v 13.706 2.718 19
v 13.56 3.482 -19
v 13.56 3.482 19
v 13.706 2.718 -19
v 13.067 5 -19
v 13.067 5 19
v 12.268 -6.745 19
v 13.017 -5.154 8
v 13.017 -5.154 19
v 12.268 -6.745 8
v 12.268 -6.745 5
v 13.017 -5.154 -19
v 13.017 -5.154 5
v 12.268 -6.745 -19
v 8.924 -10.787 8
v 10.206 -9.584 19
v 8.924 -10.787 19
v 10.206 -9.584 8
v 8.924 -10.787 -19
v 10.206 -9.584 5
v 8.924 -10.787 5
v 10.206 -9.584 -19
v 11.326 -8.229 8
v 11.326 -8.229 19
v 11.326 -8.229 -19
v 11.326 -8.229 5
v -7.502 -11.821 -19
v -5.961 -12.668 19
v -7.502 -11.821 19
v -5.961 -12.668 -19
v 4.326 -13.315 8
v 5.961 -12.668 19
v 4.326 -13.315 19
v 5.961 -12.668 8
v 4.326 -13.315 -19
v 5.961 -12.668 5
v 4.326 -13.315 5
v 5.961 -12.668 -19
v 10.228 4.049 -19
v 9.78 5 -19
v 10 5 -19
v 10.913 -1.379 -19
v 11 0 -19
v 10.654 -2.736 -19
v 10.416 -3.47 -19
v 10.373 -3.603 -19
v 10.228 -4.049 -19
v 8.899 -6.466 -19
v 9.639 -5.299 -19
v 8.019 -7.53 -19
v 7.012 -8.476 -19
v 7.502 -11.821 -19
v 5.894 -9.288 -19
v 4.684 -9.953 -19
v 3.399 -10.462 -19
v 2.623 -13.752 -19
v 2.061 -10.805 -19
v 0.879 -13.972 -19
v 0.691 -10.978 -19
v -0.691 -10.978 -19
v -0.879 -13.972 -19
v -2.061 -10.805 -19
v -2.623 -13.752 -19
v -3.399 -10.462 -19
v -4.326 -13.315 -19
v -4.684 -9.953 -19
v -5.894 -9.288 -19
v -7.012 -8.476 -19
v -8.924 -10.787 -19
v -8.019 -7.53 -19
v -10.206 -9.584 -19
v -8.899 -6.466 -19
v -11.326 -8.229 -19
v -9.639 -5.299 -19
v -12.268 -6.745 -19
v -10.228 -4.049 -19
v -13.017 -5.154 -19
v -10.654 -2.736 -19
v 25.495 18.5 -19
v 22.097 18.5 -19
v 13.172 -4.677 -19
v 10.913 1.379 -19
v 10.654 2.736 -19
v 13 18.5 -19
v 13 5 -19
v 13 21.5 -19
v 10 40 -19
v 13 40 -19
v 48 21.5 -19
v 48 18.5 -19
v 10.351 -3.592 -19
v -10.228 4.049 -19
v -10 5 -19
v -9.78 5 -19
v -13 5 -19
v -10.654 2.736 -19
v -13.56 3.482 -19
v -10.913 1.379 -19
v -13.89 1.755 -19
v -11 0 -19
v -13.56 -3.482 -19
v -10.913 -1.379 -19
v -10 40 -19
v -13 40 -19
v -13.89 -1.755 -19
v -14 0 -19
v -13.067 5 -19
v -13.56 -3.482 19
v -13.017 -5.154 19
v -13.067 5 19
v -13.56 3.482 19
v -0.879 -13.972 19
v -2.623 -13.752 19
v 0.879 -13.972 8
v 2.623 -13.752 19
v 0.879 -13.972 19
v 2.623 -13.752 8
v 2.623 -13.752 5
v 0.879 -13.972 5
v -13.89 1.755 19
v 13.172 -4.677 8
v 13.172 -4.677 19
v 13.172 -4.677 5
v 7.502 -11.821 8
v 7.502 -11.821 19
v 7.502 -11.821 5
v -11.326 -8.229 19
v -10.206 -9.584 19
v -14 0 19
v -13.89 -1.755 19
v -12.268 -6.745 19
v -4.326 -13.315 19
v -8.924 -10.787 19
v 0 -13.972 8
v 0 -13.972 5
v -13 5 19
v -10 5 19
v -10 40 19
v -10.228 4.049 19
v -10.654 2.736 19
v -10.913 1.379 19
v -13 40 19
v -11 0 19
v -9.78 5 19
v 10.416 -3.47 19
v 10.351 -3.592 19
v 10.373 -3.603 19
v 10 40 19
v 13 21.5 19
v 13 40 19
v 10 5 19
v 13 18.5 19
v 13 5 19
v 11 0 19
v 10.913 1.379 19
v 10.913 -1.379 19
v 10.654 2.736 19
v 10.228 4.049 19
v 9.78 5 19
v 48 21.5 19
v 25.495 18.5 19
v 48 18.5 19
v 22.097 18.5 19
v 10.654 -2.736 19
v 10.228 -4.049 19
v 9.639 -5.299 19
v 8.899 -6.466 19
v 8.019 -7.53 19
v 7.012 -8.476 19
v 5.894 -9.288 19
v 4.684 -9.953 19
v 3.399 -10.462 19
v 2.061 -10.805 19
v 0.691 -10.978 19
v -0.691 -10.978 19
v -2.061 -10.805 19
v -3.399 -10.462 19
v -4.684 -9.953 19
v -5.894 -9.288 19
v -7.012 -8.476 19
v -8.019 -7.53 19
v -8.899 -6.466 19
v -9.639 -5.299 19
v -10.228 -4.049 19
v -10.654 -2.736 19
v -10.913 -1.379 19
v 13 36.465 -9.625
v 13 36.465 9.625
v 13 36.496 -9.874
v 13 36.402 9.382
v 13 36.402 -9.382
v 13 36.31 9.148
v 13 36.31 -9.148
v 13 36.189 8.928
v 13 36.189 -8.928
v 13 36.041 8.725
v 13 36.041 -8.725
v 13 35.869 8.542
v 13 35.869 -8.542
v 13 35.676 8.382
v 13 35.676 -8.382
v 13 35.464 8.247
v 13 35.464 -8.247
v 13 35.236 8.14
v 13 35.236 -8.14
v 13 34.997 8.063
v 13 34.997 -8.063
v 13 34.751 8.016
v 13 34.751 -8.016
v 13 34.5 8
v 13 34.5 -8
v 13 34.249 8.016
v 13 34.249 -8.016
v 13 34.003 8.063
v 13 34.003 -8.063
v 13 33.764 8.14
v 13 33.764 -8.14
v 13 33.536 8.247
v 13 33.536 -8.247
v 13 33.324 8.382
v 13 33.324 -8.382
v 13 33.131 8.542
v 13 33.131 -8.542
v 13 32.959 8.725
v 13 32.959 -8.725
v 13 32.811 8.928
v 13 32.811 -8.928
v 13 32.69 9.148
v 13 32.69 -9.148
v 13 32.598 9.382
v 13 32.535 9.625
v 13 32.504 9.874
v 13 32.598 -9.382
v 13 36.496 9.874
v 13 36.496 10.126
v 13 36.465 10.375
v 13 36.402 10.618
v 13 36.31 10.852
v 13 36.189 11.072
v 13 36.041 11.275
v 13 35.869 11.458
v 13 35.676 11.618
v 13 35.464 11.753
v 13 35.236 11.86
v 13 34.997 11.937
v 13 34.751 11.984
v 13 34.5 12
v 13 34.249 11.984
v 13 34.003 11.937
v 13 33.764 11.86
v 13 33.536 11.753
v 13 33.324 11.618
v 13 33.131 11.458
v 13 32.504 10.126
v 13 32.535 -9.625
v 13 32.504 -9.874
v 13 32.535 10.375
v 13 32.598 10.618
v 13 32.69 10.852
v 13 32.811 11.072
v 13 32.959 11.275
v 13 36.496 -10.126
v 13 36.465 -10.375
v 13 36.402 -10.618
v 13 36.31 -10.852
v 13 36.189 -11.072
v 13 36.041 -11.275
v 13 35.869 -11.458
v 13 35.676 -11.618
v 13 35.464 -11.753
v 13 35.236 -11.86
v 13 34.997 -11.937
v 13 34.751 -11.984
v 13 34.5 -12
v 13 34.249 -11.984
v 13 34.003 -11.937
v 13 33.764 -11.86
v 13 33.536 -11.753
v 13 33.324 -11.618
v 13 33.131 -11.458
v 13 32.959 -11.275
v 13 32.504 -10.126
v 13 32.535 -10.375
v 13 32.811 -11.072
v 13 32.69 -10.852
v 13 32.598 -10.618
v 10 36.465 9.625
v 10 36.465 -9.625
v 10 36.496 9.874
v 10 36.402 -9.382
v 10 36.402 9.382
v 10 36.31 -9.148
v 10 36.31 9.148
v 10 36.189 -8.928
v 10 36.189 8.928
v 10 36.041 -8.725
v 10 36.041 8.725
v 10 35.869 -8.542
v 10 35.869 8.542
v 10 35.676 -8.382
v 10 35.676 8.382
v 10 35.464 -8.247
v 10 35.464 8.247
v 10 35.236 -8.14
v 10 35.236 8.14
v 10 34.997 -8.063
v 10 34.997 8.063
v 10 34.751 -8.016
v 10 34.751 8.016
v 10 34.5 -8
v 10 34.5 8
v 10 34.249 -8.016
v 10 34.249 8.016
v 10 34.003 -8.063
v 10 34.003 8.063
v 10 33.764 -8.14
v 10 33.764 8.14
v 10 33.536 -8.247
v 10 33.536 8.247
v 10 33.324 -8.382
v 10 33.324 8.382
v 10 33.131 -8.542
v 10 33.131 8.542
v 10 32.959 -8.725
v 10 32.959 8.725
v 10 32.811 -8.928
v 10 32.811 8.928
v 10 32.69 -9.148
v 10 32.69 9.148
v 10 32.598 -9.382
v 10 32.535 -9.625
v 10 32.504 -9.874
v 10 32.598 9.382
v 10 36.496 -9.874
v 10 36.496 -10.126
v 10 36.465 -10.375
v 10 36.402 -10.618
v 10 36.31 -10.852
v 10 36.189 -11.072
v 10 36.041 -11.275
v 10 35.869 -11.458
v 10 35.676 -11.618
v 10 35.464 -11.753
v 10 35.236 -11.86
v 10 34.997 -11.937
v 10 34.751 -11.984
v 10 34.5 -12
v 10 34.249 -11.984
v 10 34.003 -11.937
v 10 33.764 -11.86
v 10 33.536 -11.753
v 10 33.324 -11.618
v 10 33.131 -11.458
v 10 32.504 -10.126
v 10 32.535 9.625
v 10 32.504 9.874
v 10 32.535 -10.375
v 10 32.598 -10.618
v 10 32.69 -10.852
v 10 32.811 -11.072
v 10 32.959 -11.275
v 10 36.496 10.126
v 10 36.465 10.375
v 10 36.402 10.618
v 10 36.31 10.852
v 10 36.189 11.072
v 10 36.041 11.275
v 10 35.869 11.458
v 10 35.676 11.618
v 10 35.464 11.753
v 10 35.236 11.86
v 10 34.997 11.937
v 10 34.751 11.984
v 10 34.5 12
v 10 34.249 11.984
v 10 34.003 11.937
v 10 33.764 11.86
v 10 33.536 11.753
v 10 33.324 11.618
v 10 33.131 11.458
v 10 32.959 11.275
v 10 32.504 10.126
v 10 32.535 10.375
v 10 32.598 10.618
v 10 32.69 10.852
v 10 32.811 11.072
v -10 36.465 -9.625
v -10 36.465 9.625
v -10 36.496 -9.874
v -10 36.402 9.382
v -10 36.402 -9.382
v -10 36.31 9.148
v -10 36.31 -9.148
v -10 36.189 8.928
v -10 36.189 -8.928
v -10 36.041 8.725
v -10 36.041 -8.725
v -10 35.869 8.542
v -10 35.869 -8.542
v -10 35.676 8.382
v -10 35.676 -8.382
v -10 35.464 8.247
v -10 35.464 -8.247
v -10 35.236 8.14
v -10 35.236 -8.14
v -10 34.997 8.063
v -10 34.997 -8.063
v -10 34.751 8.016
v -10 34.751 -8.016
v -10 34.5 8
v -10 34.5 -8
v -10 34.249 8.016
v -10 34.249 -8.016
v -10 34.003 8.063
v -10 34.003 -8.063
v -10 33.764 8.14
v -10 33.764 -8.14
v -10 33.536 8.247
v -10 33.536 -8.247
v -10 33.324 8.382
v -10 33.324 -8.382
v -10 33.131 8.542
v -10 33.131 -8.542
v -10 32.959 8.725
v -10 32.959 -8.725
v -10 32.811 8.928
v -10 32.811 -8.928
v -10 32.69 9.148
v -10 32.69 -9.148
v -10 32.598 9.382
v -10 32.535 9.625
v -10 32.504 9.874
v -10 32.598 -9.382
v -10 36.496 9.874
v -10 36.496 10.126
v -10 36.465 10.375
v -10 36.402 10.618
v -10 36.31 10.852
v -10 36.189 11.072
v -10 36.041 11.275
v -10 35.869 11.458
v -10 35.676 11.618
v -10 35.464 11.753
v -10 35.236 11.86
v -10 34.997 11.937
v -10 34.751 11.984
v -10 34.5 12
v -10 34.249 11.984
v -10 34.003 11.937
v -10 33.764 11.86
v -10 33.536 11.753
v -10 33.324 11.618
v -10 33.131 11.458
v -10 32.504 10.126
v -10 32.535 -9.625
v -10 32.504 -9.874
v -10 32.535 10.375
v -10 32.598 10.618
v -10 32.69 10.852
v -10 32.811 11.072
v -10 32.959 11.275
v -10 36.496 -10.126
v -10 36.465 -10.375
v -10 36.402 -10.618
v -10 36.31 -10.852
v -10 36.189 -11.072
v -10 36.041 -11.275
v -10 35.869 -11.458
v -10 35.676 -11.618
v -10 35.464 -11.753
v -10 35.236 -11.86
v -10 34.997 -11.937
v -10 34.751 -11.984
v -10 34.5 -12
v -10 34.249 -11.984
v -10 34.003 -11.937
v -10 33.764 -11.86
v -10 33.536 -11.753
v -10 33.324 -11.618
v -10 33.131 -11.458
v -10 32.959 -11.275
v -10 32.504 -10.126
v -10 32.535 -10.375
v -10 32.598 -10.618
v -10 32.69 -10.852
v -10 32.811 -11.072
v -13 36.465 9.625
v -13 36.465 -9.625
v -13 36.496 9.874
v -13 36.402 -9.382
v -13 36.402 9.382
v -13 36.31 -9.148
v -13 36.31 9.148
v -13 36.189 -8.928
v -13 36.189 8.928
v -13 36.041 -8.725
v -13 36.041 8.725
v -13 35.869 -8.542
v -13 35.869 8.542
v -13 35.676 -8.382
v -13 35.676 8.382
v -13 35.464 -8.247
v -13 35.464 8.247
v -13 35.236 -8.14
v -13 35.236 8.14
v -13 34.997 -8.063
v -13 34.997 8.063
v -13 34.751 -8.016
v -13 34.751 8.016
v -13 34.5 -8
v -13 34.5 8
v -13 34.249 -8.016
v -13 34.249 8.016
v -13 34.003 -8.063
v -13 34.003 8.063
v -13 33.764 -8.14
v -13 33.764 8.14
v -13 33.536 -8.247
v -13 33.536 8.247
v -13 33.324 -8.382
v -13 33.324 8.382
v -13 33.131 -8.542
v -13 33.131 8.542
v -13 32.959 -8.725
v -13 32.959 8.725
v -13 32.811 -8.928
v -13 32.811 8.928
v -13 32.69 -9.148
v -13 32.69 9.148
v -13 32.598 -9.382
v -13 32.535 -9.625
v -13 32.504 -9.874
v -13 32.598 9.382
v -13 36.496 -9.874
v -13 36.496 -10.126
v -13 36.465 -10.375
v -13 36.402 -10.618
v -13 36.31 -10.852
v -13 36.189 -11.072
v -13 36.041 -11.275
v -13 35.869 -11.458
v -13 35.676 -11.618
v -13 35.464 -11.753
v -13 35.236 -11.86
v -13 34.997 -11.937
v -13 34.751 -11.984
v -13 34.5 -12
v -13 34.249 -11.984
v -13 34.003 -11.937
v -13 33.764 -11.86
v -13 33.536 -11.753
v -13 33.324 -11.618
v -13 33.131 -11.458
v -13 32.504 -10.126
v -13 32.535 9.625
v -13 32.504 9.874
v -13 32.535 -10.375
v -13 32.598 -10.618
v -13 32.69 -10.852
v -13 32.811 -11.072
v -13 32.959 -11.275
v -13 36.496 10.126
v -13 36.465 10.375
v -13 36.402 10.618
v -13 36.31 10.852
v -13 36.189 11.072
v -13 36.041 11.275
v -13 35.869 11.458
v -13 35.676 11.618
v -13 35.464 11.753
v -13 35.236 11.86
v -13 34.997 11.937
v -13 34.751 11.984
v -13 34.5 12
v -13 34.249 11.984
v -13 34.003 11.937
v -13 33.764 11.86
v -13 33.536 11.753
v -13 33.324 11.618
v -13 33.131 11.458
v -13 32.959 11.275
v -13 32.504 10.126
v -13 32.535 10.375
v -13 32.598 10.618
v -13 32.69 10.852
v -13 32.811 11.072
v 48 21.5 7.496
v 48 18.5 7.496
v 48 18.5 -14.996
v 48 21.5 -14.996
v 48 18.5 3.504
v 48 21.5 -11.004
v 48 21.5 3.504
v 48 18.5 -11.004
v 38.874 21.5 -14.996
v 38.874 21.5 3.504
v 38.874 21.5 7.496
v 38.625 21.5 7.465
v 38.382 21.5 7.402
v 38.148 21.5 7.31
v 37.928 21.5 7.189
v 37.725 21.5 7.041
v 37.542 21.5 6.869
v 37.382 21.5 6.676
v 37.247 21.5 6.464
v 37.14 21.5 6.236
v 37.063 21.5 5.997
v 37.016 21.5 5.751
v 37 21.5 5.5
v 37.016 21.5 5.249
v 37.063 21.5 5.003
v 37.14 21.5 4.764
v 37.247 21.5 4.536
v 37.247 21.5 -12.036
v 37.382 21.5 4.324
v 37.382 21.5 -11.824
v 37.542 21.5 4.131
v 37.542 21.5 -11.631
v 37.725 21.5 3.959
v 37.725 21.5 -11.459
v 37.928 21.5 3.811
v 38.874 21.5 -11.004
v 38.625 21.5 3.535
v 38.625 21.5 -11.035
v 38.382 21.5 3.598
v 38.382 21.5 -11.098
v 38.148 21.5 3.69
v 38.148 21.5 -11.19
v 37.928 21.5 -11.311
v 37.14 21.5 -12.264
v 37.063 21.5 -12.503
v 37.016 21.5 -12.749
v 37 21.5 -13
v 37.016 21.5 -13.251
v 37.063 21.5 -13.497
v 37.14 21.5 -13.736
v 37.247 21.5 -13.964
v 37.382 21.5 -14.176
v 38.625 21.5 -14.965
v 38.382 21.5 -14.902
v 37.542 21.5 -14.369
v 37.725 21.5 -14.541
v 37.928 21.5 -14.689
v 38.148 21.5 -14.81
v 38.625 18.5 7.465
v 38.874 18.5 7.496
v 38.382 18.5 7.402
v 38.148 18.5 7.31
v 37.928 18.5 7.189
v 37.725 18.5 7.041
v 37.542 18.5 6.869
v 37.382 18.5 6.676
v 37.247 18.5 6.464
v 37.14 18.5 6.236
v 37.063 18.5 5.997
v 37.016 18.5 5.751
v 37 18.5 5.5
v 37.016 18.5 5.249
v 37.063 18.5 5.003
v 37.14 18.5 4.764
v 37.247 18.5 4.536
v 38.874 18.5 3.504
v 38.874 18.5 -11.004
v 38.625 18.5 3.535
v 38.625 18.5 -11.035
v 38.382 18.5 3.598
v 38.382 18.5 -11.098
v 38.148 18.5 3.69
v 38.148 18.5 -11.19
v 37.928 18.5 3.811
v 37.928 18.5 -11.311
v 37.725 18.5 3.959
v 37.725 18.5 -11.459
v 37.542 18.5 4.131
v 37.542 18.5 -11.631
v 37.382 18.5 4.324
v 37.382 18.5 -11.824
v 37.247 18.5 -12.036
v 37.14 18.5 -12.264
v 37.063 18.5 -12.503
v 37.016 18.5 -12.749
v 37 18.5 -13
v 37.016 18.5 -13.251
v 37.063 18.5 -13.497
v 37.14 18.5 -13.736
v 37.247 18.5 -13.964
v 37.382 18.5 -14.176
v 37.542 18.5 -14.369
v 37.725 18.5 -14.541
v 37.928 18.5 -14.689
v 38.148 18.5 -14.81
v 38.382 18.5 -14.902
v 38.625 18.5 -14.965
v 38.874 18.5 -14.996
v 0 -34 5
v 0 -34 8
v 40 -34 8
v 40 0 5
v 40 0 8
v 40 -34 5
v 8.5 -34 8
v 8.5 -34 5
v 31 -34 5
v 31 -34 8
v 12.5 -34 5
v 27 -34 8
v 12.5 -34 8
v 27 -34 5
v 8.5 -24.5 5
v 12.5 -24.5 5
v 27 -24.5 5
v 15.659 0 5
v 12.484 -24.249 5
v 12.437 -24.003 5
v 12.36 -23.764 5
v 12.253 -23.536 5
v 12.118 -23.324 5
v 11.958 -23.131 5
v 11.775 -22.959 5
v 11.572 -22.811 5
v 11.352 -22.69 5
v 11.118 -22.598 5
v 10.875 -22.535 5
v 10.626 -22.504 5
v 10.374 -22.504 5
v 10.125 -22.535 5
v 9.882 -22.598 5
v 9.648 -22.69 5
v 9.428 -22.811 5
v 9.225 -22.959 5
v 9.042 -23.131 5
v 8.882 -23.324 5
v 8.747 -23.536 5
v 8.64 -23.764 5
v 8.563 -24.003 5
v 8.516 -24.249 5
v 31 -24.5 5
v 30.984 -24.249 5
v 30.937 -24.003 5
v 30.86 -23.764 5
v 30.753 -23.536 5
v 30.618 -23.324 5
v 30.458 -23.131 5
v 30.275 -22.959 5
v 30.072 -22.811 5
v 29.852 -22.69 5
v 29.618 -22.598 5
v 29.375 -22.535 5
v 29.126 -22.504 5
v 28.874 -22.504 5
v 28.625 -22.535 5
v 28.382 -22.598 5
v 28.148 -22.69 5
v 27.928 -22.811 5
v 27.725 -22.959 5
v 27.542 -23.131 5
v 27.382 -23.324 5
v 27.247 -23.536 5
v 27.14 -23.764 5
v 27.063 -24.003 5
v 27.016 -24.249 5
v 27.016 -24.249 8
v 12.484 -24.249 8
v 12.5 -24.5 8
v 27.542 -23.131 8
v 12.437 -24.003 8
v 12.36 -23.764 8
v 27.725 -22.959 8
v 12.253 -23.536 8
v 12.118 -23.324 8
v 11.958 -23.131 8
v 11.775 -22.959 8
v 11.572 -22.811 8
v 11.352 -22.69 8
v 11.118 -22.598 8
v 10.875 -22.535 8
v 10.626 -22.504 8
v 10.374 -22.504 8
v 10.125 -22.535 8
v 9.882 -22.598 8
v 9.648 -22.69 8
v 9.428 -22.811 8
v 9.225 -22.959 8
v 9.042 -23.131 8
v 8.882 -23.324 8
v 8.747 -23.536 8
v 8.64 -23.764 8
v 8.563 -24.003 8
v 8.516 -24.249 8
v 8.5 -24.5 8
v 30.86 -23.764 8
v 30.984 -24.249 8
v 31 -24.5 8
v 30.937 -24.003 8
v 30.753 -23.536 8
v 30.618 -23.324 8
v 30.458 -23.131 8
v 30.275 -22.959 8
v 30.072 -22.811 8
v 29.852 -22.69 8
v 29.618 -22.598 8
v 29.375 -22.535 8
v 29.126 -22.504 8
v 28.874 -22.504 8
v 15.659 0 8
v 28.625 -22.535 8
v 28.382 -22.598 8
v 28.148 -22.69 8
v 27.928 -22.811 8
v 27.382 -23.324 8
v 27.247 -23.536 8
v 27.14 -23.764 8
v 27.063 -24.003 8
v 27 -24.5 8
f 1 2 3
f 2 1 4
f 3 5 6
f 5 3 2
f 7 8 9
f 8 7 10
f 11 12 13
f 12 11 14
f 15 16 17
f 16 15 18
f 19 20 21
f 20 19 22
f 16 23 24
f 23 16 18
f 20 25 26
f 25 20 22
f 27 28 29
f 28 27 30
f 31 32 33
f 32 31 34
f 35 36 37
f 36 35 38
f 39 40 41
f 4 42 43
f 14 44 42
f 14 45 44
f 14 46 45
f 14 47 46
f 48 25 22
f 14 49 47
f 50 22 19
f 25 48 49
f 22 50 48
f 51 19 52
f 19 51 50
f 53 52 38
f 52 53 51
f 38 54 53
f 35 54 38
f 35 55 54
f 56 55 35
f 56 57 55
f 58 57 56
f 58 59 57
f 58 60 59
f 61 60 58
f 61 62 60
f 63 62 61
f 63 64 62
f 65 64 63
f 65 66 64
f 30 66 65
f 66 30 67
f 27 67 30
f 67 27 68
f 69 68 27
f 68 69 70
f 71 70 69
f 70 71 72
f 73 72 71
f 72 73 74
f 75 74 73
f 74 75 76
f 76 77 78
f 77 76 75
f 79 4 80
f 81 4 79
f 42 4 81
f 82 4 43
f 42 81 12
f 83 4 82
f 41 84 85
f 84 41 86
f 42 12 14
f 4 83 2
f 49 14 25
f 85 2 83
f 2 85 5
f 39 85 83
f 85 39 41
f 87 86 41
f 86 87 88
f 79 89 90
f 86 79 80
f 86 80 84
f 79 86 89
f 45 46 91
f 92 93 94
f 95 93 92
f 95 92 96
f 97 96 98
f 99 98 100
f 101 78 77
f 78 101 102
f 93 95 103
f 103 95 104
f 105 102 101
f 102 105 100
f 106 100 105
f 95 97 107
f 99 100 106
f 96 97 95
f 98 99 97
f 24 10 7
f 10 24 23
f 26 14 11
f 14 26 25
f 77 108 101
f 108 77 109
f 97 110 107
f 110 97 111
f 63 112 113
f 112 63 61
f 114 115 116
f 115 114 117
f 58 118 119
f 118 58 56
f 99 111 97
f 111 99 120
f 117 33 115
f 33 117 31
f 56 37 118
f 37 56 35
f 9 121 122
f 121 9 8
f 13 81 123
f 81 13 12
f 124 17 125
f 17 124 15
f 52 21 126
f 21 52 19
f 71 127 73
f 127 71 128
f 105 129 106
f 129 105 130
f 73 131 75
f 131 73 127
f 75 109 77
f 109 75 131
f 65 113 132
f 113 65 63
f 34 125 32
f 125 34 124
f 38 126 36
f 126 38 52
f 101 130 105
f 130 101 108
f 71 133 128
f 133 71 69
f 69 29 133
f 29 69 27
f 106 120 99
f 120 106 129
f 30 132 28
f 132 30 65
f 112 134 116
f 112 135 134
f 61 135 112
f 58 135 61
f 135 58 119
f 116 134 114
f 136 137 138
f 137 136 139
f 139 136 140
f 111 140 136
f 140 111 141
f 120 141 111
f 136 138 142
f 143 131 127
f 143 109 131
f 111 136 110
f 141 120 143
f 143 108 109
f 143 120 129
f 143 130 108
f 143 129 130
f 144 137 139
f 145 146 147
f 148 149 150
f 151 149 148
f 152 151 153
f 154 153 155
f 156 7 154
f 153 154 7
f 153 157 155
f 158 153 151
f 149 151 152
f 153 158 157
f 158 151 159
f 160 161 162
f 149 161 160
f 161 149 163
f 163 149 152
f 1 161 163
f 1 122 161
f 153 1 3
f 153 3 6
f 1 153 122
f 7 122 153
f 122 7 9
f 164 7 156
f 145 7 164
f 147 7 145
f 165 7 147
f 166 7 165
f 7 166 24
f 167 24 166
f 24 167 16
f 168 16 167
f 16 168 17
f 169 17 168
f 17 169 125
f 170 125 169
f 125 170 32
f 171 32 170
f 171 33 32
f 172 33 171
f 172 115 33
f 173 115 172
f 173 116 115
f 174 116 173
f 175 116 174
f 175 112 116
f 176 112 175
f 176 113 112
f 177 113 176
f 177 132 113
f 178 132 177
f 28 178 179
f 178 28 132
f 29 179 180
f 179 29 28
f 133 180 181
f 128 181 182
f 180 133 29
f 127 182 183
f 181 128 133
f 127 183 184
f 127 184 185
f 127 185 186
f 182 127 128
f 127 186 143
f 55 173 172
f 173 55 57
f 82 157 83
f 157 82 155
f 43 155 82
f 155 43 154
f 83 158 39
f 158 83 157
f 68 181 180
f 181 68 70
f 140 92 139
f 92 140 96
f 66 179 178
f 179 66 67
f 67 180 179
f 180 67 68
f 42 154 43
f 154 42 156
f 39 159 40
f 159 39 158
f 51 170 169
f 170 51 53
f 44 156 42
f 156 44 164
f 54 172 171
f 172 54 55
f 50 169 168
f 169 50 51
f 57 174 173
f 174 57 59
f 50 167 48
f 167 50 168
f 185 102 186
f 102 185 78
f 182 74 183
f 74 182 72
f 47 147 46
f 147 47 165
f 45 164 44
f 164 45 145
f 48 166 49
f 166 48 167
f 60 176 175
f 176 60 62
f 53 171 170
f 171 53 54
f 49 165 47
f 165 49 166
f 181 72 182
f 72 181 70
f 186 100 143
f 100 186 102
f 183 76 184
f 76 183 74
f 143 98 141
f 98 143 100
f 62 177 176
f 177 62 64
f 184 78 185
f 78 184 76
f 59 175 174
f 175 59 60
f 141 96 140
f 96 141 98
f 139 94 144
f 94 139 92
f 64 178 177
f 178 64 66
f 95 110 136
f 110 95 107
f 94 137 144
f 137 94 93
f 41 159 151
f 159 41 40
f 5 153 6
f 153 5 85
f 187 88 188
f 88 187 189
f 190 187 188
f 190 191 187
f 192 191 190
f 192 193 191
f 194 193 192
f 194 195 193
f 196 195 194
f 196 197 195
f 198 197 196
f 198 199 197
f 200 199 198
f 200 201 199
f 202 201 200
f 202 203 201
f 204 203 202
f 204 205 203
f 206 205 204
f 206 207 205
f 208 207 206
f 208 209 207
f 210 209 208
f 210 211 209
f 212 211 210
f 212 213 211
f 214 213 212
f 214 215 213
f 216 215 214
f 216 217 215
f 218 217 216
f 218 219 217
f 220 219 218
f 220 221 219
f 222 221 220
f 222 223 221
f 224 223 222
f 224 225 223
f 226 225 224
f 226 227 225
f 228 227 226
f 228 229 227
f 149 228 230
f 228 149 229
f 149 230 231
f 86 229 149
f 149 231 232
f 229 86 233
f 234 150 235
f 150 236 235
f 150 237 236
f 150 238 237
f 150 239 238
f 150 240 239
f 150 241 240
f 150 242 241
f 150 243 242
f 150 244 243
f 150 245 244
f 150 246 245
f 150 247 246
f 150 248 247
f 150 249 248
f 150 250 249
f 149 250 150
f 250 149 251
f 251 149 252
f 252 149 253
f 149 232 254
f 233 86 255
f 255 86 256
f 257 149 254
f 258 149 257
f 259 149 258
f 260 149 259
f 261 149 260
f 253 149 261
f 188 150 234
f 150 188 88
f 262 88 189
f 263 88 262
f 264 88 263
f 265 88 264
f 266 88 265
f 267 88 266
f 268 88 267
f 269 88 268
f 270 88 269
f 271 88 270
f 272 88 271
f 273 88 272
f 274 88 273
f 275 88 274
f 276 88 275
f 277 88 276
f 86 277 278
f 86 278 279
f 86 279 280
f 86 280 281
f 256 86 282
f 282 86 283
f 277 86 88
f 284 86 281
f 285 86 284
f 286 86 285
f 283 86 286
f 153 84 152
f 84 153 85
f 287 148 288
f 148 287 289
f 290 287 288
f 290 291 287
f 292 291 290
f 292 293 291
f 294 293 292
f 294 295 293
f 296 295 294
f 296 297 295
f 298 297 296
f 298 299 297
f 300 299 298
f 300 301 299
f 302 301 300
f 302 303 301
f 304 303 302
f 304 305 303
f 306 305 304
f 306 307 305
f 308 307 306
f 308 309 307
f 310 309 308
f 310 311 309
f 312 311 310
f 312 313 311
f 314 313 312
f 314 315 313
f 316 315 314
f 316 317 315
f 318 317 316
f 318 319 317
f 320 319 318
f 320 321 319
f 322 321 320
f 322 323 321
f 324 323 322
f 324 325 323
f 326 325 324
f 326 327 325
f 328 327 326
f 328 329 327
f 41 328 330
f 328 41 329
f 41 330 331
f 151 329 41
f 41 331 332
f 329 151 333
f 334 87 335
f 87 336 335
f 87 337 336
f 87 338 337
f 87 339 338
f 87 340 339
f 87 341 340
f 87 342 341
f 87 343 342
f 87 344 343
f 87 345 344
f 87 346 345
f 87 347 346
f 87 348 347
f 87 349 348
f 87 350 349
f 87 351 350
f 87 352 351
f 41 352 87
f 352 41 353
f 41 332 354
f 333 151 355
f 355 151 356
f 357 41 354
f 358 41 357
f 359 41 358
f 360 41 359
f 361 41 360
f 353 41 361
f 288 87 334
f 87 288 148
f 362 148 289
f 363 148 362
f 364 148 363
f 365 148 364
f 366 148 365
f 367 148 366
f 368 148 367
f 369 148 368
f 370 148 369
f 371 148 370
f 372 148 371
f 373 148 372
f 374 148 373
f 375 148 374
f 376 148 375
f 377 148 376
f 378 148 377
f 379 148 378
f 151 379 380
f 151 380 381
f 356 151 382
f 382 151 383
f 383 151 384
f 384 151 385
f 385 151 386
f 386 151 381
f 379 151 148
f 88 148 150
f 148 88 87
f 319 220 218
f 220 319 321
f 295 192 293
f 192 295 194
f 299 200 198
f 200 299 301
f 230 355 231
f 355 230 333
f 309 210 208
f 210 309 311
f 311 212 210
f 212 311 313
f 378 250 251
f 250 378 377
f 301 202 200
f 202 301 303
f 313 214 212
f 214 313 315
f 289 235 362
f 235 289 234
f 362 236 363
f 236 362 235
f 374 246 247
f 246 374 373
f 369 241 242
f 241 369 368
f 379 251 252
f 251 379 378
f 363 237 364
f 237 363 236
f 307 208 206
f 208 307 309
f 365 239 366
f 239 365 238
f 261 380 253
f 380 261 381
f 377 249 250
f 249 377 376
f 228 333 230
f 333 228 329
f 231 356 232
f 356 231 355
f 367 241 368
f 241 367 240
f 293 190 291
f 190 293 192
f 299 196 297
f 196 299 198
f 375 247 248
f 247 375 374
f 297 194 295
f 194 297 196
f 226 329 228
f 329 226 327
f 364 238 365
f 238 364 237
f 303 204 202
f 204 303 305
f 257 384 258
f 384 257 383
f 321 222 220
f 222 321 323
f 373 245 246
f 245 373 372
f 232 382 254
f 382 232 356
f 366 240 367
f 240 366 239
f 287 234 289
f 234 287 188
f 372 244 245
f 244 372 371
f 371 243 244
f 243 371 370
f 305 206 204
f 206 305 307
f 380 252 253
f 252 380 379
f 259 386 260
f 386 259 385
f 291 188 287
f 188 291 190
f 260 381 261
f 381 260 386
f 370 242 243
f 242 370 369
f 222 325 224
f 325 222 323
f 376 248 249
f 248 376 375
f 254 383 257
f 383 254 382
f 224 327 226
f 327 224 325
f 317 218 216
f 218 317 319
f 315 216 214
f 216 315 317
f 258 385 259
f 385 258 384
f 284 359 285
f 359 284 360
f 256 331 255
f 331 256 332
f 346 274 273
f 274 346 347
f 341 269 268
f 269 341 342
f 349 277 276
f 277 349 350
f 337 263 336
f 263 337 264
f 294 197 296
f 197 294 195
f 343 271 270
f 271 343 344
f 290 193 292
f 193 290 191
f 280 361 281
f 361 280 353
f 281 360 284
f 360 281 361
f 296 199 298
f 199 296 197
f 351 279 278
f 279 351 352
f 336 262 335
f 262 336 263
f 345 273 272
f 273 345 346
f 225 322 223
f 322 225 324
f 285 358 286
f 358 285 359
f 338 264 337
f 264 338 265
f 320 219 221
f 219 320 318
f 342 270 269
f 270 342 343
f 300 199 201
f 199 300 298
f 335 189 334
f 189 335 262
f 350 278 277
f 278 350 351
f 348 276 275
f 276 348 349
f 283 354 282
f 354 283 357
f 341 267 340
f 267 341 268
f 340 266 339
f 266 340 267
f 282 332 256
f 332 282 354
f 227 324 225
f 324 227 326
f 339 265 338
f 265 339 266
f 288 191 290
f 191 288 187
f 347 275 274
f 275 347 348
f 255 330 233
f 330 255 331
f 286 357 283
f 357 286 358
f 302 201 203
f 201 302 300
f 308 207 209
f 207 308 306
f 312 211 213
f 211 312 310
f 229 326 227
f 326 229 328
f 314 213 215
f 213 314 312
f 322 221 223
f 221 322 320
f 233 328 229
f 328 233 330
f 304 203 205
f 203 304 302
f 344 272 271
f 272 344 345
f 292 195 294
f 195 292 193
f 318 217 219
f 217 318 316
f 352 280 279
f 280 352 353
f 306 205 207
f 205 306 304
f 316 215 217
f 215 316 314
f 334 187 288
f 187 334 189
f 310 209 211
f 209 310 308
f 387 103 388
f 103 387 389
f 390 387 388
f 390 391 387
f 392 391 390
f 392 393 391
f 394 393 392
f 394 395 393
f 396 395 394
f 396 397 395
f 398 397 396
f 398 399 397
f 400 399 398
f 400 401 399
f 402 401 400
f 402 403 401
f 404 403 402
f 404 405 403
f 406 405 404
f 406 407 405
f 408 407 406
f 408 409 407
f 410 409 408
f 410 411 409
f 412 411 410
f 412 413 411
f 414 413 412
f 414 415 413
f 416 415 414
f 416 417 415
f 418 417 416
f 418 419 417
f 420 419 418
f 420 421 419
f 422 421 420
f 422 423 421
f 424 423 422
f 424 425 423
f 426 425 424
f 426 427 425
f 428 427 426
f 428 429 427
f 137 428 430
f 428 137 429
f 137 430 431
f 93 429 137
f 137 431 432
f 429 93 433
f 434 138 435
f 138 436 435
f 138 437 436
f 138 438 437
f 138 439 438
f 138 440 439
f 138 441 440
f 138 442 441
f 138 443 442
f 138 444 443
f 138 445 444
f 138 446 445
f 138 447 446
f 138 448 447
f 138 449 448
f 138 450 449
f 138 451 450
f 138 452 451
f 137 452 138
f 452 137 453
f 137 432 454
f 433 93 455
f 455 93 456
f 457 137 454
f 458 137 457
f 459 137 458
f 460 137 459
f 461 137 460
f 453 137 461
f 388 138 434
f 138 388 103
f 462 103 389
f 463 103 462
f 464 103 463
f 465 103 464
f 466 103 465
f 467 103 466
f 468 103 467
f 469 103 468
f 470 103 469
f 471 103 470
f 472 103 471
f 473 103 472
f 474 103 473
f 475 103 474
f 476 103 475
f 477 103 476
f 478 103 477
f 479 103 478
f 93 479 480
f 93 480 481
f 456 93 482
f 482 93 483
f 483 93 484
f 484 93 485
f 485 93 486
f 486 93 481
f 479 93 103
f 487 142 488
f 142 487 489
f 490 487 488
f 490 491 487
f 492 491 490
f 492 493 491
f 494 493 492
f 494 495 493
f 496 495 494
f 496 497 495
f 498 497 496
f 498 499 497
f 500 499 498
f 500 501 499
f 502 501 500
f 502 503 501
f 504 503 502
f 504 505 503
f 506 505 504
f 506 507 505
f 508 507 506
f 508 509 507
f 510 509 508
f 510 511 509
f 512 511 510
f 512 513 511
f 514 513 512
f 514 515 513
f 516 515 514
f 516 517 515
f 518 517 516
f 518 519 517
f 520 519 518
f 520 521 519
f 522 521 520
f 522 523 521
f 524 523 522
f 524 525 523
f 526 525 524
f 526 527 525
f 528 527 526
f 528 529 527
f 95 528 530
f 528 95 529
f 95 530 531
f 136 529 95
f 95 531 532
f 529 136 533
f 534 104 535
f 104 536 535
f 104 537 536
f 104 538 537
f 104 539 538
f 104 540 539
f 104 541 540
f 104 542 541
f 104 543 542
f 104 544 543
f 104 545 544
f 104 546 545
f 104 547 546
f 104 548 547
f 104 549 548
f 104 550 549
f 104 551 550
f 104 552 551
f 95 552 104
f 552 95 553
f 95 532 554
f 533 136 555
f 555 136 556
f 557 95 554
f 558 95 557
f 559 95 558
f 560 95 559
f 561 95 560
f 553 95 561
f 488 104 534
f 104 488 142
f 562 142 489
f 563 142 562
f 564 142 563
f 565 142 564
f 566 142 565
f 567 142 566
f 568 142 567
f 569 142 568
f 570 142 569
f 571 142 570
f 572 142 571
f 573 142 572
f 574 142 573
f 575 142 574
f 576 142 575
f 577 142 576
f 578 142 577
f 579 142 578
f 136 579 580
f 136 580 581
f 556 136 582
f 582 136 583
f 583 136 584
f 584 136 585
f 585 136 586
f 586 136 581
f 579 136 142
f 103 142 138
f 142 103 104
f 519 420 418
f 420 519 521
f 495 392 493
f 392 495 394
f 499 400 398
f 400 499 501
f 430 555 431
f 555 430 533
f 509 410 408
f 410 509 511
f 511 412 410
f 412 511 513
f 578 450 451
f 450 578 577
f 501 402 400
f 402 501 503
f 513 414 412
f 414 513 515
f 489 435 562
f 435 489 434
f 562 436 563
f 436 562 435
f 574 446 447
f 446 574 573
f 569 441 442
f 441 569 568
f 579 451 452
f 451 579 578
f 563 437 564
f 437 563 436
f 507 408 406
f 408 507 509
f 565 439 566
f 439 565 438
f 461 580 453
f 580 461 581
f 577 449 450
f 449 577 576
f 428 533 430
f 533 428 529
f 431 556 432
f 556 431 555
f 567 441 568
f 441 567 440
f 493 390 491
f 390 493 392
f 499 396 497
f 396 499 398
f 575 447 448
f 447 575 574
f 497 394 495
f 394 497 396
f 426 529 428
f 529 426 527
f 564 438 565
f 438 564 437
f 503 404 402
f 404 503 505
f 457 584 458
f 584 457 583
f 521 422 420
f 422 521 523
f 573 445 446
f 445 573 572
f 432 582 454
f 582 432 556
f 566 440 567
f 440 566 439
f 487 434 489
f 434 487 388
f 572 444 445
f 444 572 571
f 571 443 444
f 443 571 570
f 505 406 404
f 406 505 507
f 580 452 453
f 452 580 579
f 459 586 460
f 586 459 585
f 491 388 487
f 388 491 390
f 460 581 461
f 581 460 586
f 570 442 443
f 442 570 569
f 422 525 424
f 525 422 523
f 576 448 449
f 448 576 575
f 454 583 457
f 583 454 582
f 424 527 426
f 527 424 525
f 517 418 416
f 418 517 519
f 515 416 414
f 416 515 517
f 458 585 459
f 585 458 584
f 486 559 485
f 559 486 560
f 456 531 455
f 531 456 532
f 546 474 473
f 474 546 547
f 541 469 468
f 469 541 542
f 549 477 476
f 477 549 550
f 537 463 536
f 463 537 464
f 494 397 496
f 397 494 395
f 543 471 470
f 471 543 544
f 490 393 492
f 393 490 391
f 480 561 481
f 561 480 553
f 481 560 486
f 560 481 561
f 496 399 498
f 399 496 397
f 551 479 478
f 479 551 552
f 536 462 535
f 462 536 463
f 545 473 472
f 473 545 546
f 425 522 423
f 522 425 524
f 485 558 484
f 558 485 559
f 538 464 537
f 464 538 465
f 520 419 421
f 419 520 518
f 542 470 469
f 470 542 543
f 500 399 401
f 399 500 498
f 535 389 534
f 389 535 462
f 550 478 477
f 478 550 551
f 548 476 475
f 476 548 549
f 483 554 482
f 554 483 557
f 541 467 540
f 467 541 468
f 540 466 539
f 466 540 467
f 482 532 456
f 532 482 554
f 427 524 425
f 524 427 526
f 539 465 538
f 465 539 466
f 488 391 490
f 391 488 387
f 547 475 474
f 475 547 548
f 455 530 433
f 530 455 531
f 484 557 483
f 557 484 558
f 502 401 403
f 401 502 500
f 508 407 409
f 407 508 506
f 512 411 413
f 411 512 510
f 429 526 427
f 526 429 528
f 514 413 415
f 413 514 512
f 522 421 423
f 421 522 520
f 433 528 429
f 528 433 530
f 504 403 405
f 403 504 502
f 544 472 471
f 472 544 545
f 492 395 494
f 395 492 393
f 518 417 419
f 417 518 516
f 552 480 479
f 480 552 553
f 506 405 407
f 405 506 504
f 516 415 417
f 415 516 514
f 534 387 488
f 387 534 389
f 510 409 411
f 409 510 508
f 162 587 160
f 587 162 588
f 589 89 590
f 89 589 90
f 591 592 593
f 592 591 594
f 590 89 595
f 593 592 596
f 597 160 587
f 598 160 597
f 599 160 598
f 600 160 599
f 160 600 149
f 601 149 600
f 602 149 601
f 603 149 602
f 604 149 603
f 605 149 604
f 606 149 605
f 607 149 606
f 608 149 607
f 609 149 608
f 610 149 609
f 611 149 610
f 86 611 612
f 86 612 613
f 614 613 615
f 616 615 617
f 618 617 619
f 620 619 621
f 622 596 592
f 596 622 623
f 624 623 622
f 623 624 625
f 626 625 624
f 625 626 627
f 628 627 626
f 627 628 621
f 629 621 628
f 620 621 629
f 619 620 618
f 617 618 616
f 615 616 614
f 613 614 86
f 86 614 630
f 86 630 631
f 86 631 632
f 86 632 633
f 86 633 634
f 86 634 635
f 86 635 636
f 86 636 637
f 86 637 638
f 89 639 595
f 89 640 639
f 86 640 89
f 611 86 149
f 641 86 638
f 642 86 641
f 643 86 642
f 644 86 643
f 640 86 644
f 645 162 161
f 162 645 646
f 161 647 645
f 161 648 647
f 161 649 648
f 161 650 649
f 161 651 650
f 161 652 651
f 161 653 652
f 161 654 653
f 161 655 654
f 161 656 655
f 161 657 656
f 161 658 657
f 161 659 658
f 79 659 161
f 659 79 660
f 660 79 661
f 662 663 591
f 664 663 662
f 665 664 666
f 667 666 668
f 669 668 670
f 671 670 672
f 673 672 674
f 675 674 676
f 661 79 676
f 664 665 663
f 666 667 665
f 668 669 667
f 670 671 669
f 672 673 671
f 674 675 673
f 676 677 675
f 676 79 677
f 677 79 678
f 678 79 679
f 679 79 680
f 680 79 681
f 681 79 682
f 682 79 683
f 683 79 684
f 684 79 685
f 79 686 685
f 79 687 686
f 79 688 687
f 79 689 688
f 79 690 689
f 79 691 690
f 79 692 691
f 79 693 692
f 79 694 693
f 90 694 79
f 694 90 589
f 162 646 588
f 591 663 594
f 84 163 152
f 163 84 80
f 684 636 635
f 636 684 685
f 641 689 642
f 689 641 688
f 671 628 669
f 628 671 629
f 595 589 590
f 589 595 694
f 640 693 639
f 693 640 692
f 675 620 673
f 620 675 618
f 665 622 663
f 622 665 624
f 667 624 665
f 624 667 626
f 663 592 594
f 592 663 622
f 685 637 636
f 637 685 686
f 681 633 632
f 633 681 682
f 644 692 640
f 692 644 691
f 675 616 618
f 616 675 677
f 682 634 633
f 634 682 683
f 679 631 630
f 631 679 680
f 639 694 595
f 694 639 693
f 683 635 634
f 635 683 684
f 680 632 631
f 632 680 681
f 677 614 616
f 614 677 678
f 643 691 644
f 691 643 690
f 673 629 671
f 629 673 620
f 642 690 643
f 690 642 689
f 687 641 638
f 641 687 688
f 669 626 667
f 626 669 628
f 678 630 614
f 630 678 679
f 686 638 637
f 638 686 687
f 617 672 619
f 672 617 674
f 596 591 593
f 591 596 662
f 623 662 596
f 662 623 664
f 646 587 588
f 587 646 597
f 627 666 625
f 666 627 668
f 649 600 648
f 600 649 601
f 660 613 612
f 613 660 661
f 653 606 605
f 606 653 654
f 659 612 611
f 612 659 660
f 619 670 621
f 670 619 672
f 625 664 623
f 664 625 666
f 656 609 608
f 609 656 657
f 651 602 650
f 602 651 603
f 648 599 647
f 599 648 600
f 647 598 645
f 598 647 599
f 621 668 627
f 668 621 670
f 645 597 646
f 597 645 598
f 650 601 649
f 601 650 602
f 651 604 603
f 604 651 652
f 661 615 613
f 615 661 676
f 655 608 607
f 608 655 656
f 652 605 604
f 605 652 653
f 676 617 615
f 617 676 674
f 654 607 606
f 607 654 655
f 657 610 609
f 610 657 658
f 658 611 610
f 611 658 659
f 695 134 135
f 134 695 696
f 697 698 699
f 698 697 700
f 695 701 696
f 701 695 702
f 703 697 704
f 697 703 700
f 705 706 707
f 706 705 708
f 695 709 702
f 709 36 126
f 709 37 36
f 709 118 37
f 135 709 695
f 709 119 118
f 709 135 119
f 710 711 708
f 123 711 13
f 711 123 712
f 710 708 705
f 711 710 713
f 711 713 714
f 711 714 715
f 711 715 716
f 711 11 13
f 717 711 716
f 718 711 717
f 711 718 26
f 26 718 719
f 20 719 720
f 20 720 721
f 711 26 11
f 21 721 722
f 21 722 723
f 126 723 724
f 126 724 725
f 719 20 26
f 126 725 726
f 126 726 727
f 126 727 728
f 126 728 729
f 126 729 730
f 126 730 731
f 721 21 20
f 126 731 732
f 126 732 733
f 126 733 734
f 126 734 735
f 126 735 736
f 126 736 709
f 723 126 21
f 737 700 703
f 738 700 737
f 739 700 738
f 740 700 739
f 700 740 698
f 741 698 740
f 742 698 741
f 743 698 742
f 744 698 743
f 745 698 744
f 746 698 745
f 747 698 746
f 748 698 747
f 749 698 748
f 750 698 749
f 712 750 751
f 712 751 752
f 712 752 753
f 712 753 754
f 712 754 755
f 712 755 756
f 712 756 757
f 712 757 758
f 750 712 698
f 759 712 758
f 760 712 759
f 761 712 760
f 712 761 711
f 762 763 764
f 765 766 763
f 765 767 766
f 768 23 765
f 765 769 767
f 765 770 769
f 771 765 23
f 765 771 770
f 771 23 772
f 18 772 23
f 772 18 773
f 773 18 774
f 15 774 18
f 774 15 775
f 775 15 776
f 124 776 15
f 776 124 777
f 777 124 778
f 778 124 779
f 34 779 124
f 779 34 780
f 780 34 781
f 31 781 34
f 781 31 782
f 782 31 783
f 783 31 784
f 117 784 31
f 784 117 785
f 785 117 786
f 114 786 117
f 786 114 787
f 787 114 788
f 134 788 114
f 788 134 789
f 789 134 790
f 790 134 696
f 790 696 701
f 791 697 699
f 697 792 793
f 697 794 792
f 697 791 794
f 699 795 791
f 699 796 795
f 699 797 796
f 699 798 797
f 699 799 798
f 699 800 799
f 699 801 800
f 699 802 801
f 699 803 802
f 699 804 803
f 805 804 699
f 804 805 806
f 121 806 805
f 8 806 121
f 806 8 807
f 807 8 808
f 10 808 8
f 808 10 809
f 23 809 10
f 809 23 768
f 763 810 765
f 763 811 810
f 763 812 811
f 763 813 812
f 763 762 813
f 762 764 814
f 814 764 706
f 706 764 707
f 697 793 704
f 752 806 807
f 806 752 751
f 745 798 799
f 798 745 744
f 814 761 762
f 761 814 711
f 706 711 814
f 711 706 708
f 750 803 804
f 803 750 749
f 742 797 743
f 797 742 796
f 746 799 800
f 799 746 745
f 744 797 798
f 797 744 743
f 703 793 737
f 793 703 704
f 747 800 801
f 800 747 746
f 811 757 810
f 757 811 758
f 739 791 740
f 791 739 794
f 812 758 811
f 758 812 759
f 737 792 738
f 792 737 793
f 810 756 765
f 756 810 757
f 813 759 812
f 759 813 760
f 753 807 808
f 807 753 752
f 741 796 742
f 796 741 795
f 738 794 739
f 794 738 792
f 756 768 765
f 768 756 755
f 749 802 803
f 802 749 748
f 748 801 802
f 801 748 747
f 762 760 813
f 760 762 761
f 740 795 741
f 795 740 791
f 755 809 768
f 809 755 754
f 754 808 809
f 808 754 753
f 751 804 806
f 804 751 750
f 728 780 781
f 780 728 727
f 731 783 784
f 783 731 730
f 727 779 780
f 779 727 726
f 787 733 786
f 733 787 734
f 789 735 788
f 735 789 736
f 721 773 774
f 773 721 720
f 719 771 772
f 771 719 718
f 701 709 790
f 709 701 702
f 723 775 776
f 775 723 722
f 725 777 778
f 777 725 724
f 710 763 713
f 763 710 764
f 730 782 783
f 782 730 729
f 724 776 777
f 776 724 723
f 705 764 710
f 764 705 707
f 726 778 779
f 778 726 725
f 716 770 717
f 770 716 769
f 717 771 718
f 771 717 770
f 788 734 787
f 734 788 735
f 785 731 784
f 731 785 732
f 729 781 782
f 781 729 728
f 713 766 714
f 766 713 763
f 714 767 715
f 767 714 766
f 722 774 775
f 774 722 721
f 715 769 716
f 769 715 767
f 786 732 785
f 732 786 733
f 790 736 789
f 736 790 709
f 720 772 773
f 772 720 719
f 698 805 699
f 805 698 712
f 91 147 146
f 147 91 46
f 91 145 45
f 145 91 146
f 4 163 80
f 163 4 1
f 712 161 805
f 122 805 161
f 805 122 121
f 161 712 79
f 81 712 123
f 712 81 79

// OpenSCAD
//cilindro iniziale 
difference() {
    cylinder(h=38,r=14,center=true,$fn=50);
    
    cylinder(h=41,r=11,center=true,$fn=50);
   
    translate(v=[0,15,0]) 
    
    cube(size=[50,20,50],center=true); 
    ; 
    }
 
    


//piastra 1 attaccata al cilndro
 translate(v=[11.5,22.5,0]){
    
    union(){
    difference(){
    cube(size=[3,35,38],center=true);
    
    translate(v=[0,12,10])
    rotate([0,90,0]) cylinder(h=5,r=2,center=true,$fn=50);
        
   translate(v=[0,12,-10])
    rotate([0,90,0]) cylinder(h=5,r=2,center=true,$fn=50);
  
    
        }
        
    }
  
}

//piastra 2 attaccata al cilndro    
translate(v=[-11.5,22.5,0]){
    
    union(){
    difference(){
    cube(size=[3,35,38],center=true);
    
    translate(v=[0,12,10])
    rotate([0,90,0]) cylinder(h=5,r=2,center=true,$fn=50);
        
    translate(v=[0,12,-10])
    rotate([0,90,0]) cylinder(h=5,r=2,center=true,$fn=50);
  
    
        }
        
    }
}
// supporto primo finecorsa verticale   
translate(v=[29,20,0]){
    
    union(){
    difference(){
    cube(size=[38,3,38],center=true);
    
    hull() {   
    translate(v=[20,0,-13])
    rotate([90,0,0]) cylinder(h=5,r=2,center=true,$fn=50);
    translate(v=[10,0,-13])
    rotate([90,0,0]) cylinder(h=5,r=2,center=true,$fn=50); 
        }
        
    hull() {   
    translate(v=[20,0,5.5])
    rotate([90,0,0]) cylinder(h=5,r=2,center=true,$fn=50);
    translate(v=[10,0,5.5])
    rotate([90,0,0]) cylinder(h=5,r=2,center=true,$fn=50); 
        }
    }
    }  
}
// piastra inclinata
translate(v=[13,-5,-19]){
    
    rotate([0,0,62])
    cube(size=[27,3,38]);
    
}
// supporto secondo finecorsa orizzontale
translate(v=[0,-11,5]){

    union(){
    difference(){  
    rotate([90,0,0]) 
    cube(size=[40,3,23]);
    
    hull() {
    translate(v=[29,-25,-5])
    cylinder(h=10,r=2,,$fn=50);
    translate(v=[29,-13.5,-5])
    cylinder(h=10,r=2,,$fn=50);
    }
    
    hull() {
    translate(v=[10.5,-25,-5])
    cylinder(h=10,r=2,,$fn=50);
    translate(v=[10.5,-13.5,-5])
    cylinder(h=10,r=2,,$fn=50);
    }
   }
  }

}
//pezzo in più
translate(v=[0,0,5]){
    
    difference() {
    rotate([90,0,0])
    cube(size=[40,3,15]);
    cylinder(h=41,r=14,center=true,$fn=50);
    }
}
